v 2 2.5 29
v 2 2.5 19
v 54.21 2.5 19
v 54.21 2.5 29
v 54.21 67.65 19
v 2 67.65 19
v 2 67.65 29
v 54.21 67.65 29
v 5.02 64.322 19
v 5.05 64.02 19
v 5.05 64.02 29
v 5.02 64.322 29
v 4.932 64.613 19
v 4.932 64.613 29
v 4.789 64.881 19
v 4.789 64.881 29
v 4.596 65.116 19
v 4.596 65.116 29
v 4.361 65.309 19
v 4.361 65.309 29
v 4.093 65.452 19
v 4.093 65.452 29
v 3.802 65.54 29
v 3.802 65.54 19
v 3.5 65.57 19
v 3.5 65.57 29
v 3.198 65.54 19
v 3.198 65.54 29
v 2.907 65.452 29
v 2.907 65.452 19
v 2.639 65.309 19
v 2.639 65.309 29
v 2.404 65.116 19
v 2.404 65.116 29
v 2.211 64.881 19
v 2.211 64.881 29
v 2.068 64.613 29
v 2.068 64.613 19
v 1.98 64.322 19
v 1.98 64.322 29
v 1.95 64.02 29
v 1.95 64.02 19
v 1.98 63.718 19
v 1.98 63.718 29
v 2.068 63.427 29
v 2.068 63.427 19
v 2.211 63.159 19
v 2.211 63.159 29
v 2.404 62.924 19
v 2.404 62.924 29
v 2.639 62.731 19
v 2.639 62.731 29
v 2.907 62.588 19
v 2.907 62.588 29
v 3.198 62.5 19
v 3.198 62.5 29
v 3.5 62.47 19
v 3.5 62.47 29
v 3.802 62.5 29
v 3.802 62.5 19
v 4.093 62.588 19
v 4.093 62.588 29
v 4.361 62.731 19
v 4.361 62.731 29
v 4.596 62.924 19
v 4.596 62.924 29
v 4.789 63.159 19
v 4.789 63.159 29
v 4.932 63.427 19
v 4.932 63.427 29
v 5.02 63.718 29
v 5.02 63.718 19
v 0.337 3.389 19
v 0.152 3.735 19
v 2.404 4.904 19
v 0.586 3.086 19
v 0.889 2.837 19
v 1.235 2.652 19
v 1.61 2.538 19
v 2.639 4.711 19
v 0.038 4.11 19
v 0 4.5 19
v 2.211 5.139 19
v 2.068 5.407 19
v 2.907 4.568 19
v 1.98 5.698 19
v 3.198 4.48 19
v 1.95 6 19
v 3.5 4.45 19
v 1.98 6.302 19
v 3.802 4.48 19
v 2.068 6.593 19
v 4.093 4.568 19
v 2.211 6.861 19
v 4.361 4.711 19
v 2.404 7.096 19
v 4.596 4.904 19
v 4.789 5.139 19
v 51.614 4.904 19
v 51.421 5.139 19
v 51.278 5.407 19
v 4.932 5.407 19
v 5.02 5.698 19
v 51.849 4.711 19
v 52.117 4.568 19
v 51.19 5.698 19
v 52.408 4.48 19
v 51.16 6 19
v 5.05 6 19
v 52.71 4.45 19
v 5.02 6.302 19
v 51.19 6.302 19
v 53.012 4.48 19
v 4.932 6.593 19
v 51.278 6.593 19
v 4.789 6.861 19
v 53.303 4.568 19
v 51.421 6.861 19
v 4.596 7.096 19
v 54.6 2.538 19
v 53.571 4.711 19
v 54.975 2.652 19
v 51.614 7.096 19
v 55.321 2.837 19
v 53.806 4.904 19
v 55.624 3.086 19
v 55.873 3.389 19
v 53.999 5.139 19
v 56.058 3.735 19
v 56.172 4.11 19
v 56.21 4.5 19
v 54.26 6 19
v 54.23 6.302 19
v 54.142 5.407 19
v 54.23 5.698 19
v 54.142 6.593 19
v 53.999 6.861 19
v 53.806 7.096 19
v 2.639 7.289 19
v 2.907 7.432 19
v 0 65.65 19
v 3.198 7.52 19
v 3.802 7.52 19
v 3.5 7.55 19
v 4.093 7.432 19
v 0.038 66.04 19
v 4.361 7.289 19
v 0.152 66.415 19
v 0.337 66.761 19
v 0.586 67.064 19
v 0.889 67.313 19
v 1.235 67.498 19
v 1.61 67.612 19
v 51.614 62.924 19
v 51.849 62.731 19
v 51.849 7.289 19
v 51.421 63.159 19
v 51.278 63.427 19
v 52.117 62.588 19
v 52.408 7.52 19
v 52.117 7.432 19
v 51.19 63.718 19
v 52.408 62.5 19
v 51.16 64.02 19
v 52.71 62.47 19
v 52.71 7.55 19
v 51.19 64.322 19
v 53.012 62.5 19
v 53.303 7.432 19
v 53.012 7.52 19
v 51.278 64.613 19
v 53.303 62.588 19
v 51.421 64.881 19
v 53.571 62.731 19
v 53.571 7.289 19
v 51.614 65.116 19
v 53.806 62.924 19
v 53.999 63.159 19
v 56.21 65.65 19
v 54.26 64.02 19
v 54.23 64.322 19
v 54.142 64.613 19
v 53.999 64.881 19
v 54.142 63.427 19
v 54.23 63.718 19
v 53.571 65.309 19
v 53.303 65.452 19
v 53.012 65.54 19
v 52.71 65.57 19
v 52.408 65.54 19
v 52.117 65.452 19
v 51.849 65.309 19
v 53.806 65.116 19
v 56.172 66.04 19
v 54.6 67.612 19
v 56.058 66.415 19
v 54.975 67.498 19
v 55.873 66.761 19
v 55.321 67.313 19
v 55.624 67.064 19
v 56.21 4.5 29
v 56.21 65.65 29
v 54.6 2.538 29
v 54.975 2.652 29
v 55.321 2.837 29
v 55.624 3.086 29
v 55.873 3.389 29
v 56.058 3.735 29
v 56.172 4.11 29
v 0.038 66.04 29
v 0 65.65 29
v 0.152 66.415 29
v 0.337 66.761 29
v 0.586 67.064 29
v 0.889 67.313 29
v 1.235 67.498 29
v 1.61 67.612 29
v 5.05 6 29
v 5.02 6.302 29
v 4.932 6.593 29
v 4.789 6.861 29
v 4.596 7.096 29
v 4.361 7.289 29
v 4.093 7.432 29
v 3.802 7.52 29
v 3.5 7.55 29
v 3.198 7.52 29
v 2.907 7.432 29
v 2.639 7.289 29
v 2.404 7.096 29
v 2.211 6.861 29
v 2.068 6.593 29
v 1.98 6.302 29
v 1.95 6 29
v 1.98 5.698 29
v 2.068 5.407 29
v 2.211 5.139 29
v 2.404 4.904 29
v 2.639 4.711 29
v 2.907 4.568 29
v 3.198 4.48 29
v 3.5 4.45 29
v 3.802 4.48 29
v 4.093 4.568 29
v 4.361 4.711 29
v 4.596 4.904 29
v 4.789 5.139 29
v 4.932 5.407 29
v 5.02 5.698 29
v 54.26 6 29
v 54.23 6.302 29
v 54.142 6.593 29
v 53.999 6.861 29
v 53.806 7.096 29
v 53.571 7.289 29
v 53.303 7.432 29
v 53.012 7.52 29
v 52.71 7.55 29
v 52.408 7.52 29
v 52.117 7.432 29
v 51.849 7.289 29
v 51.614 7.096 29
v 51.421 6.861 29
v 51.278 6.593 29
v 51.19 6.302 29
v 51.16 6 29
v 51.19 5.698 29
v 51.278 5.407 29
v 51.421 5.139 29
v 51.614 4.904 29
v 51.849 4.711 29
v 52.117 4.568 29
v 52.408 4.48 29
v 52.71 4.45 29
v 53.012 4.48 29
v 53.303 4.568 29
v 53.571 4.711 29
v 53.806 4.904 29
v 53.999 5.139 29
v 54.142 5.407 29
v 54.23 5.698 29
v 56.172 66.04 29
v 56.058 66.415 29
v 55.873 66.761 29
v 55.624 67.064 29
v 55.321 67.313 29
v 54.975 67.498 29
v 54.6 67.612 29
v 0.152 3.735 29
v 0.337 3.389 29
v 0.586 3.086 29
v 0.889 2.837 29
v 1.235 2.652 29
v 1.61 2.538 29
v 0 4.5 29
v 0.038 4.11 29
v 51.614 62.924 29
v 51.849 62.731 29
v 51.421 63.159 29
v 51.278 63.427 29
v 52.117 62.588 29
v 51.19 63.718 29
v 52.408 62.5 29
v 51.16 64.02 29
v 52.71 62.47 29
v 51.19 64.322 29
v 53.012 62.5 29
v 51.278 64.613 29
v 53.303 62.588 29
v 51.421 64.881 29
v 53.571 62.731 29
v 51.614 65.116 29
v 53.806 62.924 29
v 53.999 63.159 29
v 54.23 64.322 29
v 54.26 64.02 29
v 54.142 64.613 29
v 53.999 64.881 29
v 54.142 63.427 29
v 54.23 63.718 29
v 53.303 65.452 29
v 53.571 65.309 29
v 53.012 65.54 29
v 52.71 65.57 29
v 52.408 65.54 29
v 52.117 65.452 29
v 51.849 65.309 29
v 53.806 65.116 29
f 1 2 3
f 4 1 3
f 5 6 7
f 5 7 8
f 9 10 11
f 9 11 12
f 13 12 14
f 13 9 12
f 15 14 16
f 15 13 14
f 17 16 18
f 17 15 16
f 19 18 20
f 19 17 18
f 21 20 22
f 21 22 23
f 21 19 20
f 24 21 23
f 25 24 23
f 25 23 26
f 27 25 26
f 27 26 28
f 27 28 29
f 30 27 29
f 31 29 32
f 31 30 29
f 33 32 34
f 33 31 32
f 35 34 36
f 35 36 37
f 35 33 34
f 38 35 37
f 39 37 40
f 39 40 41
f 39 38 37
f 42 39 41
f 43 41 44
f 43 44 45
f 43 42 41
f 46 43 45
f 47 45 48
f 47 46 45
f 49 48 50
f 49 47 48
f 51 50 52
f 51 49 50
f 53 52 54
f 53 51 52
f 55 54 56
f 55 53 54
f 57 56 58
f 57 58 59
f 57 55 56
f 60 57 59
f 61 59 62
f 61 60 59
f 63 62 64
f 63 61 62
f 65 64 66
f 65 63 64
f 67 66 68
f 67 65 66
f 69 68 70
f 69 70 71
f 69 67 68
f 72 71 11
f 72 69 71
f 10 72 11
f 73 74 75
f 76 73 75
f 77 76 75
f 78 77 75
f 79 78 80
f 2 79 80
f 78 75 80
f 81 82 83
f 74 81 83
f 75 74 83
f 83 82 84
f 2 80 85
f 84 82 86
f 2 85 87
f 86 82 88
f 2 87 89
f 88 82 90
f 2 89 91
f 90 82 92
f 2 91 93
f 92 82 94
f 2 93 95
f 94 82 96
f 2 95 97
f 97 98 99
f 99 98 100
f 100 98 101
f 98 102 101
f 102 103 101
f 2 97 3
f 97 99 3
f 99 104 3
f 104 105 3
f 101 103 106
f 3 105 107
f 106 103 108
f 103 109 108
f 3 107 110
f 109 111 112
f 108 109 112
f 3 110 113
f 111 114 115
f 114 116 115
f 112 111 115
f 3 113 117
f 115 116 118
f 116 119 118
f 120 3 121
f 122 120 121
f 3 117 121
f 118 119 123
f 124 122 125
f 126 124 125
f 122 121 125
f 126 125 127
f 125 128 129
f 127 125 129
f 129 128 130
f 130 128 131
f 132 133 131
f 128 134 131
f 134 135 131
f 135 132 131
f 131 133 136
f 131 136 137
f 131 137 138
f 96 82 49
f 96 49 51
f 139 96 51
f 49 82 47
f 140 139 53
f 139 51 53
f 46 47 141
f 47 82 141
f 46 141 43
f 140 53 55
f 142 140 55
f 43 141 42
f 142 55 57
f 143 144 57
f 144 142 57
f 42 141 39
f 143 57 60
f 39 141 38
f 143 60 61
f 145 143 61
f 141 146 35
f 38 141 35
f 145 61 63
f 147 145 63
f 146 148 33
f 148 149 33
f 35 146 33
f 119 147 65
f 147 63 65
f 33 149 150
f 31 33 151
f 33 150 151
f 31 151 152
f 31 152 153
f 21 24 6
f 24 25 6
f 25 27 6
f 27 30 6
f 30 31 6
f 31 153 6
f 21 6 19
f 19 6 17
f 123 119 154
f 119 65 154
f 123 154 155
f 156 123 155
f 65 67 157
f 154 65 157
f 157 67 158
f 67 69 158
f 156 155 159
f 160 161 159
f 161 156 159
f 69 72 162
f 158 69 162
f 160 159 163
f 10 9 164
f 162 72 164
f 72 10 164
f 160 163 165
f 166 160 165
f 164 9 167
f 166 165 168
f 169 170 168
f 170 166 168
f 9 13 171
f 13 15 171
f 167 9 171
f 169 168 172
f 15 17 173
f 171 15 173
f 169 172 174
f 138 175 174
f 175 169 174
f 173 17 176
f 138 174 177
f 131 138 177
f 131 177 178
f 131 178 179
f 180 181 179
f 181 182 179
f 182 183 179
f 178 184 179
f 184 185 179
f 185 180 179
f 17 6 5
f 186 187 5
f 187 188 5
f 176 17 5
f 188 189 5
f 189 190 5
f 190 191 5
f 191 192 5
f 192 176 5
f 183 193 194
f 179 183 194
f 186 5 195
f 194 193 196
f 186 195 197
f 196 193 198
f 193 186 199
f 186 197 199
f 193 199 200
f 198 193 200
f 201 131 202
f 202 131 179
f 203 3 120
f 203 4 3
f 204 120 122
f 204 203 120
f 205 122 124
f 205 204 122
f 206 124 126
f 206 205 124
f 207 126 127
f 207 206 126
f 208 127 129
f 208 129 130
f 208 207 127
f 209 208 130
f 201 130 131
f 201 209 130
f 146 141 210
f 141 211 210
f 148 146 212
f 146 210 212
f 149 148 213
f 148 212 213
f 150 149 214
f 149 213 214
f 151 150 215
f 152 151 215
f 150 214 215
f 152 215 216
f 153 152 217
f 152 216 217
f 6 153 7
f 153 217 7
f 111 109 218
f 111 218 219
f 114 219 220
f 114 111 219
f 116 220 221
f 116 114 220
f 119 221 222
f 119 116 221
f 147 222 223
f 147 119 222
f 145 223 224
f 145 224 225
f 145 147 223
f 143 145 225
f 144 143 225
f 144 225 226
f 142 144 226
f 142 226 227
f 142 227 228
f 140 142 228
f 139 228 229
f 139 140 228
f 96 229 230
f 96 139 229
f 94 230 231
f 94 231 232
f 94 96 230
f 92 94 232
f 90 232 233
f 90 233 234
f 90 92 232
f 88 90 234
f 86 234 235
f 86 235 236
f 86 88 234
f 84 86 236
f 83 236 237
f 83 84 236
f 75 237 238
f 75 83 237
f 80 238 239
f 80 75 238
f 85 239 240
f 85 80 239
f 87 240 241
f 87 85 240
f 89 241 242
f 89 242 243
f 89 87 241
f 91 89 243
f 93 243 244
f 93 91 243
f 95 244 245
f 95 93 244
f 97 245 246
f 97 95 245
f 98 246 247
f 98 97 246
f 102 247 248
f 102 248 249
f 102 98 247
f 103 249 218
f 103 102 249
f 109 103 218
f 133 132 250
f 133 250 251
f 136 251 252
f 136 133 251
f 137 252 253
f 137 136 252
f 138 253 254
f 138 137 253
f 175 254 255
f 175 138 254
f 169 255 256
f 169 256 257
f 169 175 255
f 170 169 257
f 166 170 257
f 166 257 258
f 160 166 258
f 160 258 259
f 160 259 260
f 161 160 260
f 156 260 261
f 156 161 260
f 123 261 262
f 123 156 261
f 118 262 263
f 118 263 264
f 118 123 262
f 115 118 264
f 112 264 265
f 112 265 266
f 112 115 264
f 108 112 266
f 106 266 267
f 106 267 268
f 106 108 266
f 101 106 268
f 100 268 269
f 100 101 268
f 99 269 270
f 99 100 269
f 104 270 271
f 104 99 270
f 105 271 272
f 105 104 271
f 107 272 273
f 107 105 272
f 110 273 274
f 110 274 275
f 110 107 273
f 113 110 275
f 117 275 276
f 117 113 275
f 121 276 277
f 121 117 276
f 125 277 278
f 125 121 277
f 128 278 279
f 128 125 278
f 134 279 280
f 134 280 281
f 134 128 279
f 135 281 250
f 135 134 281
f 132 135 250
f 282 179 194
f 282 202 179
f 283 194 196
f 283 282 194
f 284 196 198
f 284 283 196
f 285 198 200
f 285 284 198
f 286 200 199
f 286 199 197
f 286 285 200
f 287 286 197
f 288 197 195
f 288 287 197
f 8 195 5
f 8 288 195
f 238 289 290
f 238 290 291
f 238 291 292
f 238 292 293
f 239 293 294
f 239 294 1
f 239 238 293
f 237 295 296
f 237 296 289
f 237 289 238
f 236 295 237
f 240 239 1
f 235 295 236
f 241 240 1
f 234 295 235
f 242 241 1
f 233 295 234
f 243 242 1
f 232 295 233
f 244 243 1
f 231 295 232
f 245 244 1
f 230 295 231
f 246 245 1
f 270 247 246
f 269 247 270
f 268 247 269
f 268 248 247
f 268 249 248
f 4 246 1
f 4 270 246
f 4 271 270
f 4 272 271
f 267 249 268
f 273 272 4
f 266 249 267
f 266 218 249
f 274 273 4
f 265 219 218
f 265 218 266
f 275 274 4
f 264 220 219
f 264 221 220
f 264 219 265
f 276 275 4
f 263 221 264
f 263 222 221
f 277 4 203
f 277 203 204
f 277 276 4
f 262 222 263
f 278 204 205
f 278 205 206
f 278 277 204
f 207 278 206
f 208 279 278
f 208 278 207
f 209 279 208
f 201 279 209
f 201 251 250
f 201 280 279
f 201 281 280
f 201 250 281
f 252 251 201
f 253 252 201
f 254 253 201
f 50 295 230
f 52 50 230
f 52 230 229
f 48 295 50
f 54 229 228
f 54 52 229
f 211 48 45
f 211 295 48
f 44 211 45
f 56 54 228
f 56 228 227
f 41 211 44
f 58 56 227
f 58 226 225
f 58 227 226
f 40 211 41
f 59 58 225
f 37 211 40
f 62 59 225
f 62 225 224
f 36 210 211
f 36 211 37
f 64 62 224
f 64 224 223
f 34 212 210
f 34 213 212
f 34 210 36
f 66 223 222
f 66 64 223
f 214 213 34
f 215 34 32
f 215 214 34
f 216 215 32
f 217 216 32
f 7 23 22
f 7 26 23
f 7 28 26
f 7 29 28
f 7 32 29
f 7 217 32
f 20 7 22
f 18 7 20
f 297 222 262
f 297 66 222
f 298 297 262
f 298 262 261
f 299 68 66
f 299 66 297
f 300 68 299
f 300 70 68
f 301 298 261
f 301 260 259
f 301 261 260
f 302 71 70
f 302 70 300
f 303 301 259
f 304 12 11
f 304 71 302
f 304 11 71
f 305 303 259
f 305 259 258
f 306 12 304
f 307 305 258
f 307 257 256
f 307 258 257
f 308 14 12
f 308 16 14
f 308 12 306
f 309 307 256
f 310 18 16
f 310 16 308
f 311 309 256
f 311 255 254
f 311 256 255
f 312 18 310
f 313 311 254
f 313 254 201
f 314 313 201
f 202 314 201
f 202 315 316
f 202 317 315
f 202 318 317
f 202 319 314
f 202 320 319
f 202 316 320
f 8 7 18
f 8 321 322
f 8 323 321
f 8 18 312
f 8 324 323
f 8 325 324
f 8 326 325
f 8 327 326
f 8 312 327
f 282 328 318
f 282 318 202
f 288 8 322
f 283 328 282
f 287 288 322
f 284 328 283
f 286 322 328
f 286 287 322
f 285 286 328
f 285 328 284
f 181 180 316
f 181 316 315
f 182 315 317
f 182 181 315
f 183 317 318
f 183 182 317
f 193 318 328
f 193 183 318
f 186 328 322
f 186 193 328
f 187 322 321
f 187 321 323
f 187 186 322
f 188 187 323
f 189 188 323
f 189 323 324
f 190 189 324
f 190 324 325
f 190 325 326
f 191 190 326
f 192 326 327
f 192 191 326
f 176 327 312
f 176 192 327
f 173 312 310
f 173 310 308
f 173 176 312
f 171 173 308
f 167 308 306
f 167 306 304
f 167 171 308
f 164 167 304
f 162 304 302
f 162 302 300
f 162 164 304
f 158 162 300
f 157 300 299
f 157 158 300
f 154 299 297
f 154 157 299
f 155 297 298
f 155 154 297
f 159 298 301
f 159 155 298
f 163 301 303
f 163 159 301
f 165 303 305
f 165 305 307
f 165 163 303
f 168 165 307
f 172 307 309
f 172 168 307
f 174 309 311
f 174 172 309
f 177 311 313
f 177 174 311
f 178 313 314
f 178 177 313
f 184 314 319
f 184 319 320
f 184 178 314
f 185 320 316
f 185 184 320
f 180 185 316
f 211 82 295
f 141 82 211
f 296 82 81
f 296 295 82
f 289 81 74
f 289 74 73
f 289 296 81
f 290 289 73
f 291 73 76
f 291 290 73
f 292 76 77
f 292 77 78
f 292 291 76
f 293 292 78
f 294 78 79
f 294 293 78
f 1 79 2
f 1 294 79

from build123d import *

# Parameters (mm, degrees)
CYLINDER010_R     = 1.55
CYLINDER010_DEPTH = 10
CYLINDER011_R     = 1.55
CYLINDER011_DEPTH = 10
CYLINDER012_R     = 1.55
CYLINDER012_DEPTH = 10
CYLINDER_R        = 1.55
CYLINDER_DEPTH    = 10
BOX_W             = 56.21
BOX_H             = 65.15
BOX_DEPTH         = 10
FILLET024_R       = 2


with BuildPart() as cylinder010:
    # Cylinder010 → Cylinder010 (new body)
    with BuildSketch(Plane(origin=(3.5, 61.52, 0), x_dir=(1, 0, 0), z_dir=(0, 0, 1))):
        Circle(CYLINDER010_R)
    extrude(amount=CYLINDER010_DEPTH)


with BuildPart() as cylinder011:
    # Cylinder011 → Cylinder011 (new body)
    with BuildSketch(Plane(origin=(52.71, 3.5, 0), x_dir=(1, 0, 0), z_dir=(0, 0, 1))):
        Circle(CYLINDER011_R)
    extrude(amount=CYLINDER011_DEPTH)


with BuildPart() as cylinder012:
    # Cylinder012 → Cylinder012 (new body)
    with BuildSketch(Plane(origin=(52.71, 61.52, 0), x_dir=(1, 0, 0), z_dir=(0, 0, 1))):
        Circle(CYLINDER012_R)
    extrude(amount=CYLINDER012_DEPTH)


with BuildPart() as fusion_holes:
    # Cylinder → Cylinder (new body)
    with BuildSketch(Plane(origin=(3.5, 3.5, 0), x_dir=(1, 0, 0), z_dir=(0, 0, 1))):
        Circle(CYLINDER_R)
    extrude(amount=CYLINDER_DEPTH)

    # Fusion: union Cylinder010, Cylinder011, Cylinder012
    add(cylinder010.part)
    add(cylinder011.part)
    add(cylinder012.part)


with BuildPart() as board:
    # Box → Box (new body)
    with BuildSketch(Plane.XY):
        with Locations((28.105, 32.575)):
            Rectangle(BOX_W, BOX_H)
    extrude(amount=BOX_DEPTH)

    # Fillet024
    fillet024_edges = [board.edges().sort_by_distance(p)[0] for p in [
        (0, 0, 5),
        (0, 65.15, 5),
        (56.21, 0, 5),
        (56.21, 65.15, 5),
    ]]
    fillet(fillet024_edges, radius=FILLET024_R)

    # Cut: cut Fusion - holes
    add(fusion_holes.part, mode=Mode.SUBTRACT)


with BuildPart() as board_1:
    # Cut placement: moved
    add(board.part.moved(Location((0, 2.5, 19))))


solid = board_1.part
